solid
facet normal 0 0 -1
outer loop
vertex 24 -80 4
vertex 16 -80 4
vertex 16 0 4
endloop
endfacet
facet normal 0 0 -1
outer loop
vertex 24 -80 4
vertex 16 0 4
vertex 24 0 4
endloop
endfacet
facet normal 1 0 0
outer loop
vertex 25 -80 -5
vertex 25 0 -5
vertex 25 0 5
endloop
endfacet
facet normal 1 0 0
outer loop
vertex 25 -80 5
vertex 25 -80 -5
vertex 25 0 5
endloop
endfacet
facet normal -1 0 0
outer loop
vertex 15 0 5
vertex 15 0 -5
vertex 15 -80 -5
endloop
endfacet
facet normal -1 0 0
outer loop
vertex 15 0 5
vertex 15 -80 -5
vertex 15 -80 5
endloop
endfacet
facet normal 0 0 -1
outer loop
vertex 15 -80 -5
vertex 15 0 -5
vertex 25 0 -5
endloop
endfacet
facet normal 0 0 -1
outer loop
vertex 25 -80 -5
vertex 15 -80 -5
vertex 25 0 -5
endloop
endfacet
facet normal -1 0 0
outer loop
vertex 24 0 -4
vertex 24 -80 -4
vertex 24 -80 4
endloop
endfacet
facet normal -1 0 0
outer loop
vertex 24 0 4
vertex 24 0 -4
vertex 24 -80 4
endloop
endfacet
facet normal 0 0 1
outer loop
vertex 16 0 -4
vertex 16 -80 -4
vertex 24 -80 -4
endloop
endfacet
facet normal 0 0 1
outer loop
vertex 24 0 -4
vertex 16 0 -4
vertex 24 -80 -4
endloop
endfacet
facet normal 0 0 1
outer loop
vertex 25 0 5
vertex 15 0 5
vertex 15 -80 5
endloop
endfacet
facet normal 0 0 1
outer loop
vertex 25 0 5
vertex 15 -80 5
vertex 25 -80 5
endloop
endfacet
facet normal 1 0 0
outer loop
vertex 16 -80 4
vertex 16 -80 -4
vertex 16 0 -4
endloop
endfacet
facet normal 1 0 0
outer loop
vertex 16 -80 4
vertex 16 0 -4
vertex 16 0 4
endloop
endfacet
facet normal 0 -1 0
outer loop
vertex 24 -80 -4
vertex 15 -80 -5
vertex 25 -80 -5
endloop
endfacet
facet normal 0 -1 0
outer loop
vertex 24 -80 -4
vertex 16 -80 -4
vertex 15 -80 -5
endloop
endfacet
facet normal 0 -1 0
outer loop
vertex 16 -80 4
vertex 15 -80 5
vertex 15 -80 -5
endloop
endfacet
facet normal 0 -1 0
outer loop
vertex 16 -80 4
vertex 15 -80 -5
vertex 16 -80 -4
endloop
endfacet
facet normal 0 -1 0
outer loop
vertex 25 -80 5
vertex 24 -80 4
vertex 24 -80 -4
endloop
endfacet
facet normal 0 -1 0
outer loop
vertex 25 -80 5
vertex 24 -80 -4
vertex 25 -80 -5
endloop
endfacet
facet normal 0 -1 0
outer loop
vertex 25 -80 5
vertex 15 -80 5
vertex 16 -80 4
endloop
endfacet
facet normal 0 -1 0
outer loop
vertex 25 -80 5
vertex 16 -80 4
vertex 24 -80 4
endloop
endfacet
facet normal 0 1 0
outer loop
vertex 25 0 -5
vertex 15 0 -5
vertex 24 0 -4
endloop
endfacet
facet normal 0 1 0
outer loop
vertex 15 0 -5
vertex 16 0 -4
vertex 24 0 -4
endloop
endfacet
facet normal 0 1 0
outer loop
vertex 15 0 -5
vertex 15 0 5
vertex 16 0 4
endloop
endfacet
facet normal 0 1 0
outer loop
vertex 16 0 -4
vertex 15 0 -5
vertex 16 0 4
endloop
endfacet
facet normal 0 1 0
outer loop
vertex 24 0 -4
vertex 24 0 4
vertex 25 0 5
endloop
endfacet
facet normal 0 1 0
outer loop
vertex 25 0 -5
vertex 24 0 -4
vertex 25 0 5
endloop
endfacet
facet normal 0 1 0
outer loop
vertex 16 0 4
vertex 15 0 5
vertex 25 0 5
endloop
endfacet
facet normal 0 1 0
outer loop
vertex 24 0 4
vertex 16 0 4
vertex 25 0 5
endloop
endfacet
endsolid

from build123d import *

# Parameters (mm, degrees)
SKETCH_1_W      = 10
SKETCH_1_H      = 10
SKETCH_1_W_2    = 8
SKETCH_1_H_2    = 8
EXTRUDE_1_DEPTH = 80


with BuildPart() as part:
    # 草图1 → 凸台-拉伸1 (new body)
    with BuildSketch(Plane.XZ.offset(80)):
        with Locations((20, 0)):
            Rectangle(SKETCH_1_W, SKETCH_1_H)
        with Locations((20, 0)):
            Rectangle(SKETCH_1_W_2, SKETCH_1_H_2, mode=Mode.SUBTRACT)
    extrude(amount=-EXTRUDE_1_DEPTH)


solid = part.part
